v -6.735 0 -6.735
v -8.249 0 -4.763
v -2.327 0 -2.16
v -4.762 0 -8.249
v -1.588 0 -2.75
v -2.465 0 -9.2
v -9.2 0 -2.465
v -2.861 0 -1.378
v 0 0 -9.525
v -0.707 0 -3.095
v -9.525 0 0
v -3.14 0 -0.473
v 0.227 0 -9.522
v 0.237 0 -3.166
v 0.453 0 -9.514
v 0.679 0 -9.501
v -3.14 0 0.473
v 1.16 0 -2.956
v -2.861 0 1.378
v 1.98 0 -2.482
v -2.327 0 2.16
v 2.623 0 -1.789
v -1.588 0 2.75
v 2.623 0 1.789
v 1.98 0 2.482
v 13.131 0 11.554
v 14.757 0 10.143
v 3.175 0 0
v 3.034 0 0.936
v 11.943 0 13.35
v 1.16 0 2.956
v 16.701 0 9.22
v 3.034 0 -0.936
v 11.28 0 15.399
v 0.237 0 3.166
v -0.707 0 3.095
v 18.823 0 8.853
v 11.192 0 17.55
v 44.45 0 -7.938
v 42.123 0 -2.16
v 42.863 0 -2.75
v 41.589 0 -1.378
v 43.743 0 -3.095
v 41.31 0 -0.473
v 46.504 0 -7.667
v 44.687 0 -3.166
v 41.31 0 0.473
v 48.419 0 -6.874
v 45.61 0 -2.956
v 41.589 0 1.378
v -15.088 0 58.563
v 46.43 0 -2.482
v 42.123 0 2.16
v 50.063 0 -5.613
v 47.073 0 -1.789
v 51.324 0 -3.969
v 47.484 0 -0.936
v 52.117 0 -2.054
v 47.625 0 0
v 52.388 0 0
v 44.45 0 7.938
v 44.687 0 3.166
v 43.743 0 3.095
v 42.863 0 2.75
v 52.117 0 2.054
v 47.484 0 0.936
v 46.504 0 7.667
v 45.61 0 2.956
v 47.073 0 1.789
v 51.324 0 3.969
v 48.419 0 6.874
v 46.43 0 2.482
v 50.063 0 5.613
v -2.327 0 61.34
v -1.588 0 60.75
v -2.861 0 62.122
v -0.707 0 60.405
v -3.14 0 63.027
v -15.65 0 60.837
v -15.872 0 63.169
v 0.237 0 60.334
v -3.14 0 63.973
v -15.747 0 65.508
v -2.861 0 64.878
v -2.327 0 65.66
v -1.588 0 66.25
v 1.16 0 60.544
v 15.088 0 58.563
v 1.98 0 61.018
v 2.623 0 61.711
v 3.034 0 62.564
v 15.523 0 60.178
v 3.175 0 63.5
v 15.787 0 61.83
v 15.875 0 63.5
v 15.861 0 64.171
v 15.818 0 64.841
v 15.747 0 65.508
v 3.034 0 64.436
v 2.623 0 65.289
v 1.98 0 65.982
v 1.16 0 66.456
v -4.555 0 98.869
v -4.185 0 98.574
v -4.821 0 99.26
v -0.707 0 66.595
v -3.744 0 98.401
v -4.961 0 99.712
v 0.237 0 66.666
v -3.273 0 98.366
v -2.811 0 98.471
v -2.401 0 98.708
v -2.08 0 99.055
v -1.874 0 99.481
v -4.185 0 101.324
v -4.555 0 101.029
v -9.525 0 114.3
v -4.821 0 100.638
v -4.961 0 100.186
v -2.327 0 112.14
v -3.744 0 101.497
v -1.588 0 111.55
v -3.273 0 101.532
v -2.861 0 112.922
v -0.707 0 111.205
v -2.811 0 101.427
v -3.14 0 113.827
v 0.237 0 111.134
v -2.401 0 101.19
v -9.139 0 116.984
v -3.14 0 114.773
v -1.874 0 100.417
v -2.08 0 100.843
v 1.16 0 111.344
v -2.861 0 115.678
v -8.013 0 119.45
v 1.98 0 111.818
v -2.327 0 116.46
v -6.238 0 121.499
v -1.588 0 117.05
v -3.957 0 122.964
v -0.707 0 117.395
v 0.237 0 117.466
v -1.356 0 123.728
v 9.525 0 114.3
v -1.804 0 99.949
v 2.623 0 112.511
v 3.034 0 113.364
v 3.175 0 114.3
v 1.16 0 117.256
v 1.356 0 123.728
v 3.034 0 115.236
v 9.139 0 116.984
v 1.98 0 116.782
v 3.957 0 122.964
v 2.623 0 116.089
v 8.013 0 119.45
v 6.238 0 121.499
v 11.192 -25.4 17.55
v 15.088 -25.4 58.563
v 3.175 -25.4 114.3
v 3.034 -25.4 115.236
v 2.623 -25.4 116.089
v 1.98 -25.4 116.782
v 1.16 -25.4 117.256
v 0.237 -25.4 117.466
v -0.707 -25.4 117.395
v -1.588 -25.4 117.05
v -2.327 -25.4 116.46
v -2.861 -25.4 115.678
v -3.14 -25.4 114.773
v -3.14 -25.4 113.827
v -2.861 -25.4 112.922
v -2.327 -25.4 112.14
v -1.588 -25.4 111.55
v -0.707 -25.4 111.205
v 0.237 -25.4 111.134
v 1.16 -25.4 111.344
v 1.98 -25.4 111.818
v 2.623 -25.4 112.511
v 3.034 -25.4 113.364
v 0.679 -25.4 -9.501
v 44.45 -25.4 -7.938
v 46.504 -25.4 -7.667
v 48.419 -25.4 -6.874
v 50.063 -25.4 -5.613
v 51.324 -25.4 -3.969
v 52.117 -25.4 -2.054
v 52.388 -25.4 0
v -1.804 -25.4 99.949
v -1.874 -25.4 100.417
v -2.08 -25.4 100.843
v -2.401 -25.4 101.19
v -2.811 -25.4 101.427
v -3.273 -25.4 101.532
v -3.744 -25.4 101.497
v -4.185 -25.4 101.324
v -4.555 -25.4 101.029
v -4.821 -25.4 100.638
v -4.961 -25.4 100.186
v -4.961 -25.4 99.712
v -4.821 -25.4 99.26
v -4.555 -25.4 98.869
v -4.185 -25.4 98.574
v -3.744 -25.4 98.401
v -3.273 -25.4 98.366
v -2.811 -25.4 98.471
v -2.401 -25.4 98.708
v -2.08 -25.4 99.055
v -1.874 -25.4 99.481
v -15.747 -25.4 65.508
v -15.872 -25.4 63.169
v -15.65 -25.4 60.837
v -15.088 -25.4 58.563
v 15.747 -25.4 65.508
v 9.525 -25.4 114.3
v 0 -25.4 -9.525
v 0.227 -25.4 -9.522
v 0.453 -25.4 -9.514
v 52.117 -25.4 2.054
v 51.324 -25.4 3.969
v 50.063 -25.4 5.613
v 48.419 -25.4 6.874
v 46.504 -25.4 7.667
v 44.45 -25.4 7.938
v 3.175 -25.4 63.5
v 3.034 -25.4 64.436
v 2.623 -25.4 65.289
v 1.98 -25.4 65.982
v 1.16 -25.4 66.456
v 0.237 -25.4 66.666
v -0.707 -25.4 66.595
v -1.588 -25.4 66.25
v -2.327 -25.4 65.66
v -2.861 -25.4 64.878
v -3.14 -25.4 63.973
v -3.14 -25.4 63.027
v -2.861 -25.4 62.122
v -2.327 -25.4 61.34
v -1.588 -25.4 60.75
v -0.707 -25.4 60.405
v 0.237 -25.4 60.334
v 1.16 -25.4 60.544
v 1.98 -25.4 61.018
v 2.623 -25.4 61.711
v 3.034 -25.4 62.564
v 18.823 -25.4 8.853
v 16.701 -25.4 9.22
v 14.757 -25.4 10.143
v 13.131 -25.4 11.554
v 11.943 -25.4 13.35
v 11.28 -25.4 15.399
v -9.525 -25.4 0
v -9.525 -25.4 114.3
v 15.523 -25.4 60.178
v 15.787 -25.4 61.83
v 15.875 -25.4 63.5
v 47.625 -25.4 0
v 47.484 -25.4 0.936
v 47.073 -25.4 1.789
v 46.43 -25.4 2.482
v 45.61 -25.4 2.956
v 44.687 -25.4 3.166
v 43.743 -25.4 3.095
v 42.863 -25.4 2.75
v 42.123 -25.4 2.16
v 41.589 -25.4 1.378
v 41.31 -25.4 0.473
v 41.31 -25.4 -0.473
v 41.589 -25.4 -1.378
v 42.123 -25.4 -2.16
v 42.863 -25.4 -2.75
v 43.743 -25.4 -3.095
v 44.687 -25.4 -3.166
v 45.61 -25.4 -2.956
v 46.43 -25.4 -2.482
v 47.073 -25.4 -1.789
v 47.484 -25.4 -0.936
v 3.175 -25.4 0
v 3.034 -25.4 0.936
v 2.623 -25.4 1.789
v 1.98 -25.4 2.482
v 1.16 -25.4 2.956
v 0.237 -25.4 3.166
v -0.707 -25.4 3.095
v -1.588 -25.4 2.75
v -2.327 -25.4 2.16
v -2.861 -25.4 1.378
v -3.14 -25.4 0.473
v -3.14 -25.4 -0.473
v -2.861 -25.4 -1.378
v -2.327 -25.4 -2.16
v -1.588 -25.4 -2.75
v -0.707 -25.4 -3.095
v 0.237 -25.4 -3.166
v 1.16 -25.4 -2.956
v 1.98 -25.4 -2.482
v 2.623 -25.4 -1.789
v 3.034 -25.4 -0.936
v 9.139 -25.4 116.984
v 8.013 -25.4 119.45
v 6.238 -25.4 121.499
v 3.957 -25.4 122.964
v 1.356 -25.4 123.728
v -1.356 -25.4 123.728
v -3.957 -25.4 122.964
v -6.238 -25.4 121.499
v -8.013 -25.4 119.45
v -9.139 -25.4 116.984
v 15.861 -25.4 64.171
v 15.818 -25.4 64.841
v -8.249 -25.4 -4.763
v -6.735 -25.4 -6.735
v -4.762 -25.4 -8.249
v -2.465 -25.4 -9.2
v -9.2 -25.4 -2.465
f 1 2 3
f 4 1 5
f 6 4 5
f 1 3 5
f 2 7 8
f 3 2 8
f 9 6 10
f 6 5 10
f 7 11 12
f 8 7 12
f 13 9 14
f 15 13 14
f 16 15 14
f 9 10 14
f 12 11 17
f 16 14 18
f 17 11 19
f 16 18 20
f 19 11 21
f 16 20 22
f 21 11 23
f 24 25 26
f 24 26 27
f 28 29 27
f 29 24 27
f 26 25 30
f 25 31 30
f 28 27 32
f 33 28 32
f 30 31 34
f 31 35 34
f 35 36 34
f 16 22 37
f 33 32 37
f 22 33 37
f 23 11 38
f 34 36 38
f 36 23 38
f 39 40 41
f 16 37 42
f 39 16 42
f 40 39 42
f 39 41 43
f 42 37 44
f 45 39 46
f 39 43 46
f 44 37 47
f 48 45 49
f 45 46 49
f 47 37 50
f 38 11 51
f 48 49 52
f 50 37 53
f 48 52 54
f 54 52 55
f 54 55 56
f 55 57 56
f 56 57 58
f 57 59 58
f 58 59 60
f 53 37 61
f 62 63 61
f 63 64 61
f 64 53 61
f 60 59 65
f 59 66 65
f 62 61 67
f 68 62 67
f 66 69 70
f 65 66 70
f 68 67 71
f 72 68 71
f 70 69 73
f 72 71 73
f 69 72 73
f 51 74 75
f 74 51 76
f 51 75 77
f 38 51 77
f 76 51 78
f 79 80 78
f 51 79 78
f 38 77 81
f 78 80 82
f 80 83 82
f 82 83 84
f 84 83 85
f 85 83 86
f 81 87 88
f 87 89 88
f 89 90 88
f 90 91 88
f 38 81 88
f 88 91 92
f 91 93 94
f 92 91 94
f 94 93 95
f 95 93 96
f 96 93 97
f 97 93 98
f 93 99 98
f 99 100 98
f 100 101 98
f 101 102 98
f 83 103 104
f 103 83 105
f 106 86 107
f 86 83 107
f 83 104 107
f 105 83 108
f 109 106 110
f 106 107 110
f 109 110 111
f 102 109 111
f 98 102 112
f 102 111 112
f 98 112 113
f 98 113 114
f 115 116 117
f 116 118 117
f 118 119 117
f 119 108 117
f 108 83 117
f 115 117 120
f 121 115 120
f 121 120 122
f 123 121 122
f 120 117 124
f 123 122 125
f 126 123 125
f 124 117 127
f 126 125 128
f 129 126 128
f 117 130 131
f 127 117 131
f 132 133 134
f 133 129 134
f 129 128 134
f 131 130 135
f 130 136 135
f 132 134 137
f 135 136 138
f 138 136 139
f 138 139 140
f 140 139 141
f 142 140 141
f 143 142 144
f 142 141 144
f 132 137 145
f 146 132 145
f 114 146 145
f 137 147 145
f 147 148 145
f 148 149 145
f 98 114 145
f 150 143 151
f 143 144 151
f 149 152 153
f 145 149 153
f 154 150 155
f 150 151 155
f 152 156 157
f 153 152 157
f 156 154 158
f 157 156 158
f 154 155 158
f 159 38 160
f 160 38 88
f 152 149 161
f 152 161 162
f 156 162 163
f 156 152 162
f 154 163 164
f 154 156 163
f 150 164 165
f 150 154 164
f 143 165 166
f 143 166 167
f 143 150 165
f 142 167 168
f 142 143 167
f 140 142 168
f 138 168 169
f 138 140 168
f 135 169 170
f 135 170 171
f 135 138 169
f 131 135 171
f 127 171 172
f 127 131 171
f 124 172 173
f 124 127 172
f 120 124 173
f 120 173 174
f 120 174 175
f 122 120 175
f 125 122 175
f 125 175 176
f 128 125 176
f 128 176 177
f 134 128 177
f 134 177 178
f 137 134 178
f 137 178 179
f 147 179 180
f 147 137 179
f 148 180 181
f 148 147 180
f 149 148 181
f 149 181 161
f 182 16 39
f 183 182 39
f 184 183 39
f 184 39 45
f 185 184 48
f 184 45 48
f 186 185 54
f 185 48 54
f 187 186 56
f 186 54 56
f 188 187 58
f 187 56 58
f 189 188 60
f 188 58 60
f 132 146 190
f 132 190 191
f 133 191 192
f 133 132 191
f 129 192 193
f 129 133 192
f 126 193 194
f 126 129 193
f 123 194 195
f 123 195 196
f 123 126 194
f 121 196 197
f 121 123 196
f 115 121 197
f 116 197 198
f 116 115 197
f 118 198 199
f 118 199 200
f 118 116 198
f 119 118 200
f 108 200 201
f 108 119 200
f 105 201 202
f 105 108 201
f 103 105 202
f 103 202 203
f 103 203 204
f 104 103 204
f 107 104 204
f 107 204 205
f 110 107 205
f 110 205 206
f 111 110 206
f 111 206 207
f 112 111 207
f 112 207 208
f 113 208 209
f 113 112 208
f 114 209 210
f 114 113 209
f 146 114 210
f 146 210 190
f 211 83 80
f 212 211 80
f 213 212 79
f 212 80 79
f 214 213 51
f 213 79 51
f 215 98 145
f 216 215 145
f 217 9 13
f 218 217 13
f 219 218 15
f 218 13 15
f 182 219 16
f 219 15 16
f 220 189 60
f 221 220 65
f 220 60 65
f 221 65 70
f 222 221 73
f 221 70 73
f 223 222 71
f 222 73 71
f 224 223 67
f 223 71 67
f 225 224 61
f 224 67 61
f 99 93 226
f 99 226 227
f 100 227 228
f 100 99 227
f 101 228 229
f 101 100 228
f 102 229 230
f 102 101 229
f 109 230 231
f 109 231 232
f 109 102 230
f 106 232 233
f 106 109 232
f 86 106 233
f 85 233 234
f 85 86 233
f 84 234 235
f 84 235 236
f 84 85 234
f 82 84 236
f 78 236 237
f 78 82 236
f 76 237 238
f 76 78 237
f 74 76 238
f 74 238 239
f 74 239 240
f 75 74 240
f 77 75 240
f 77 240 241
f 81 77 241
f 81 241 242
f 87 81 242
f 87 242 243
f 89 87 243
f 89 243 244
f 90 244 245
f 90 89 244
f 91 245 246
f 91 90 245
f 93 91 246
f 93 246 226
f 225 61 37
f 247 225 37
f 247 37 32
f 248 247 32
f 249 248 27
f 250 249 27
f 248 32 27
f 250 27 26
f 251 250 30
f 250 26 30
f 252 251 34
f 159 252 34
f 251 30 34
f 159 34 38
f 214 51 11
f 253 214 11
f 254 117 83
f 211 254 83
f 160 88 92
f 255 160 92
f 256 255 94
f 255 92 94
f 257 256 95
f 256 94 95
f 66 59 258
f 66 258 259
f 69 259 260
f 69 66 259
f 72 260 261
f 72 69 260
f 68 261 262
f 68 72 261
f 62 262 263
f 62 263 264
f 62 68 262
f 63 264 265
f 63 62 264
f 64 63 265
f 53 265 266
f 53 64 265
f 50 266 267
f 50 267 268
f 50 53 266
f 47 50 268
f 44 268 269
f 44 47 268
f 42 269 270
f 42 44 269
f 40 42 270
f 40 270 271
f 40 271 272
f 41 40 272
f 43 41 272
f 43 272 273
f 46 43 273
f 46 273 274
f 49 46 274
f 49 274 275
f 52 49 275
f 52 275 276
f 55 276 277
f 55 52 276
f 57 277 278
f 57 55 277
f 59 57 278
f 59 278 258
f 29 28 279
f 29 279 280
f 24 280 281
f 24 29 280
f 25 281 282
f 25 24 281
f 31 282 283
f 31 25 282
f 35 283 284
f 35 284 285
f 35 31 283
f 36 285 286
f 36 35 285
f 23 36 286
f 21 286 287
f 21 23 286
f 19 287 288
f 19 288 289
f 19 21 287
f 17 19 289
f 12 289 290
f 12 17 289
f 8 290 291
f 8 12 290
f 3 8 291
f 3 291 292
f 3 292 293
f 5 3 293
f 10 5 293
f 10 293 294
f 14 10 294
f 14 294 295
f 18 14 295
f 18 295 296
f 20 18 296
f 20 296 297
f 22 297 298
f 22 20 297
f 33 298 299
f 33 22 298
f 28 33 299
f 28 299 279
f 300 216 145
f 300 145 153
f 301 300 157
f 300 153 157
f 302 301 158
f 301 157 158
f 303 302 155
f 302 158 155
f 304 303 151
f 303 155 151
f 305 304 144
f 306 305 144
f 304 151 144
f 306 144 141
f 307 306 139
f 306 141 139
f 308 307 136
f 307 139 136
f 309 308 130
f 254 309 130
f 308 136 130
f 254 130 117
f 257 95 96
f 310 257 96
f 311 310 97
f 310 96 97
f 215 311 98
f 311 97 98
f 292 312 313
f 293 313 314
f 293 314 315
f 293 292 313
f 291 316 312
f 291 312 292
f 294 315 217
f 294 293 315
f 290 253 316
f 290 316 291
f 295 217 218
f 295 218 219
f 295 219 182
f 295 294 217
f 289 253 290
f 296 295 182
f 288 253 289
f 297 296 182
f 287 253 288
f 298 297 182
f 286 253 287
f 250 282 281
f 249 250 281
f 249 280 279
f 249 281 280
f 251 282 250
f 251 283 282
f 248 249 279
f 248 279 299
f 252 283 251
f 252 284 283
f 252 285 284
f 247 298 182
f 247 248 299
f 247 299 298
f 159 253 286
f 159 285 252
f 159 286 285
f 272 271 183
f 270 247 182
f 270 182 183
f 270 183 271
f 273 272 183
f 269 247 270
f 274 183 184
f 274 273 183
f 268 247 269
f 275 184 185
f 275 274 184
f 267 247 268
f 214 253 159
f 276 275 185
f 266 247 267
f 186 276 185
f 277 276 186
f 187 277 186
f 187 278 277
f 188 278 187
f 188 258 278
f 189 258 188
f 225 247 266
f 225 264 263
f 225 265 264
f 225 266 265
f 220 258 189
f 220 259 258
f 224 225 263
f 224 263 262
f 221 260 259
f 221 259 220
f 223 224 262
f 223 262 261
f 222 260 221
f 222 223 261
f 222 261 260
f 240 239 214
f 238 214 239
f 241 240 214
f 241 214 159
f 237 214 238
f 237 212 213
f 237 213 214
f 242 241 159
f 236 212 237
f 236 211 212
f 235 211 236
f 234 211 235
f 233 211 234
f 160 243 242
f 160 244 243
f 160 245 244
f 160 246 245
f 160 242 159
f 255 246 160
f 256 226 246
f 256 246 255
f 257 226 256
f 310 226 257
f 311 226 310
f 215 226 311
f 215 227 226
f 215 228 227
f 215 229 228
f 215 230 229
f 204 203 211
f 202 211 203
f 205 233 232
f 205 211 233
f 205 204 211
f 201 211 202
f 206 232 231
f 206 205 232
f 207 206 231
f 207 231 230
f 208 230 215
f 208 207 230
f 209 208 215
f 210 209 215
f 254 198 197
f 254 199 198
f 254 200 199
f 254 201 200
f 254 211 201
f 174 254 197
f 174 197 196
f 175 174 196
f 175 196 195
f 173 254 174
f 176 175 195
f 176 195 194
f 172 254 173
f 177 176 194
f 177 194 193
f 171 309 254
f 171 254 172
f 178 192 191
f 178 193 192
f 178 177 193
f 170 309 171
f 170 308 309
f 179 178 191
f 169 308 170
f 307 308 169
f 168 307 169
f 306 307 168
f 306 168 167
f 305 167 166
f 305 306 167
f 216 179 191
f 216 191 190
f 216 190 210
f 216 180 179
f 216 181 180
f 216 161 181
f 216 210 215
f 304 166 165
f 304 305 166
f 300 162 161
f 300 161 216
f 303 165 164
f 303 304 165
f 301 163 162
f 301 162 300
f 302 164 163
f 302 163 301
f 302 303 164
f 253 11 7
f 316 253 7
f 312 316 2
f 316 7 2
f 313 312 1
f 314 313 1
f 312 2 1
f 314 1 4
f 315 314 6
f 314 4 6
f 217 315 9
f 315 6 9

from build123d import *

# Parameters (mm, degrees)
F0_R     = 3.175
F0_R_2   = 1.5875
F1_DEPTH = 25.4


with BuildPart() as f1:
    # F0 (on Front) → F1 (new body)
    with BuildSketch(Plane.XZ):
        with BuildLine():
            ThreePointArc((15.0877196672, 58.5627598555), (15.6769444522, 61.0001924791), (15.875, 63.5))
            ThreePointArc((15.875, 63.5), (15.8430821396, 64.5061676396), (15.7474569047, 65.5082893304))
            Line((15.7474569047, 65.5082893304), (15.0877196672, 58.5627598555))
        make_face()
        with BuildLine():
            Line((15.0877196672, 58.5627598555), (15.7474569047, 65.5082893304))
            ThreePointArc((15.7474569047, 65.5082893304), (0, 79.375), (-15.7474569047, 65.5082893304))
            Line((-15.7474569047, 65.5082893304), (-15.0877196672, 58.5627598555))
            ThreePointArc((-15.0877196672, 58.5627598555), (0, 47.625), (15.0877196672, 58.5627598555))
        make_face()
        with Locations((0, 63.5)):
            Circle(F0_R, mode=Mode.SUBTRACT)
        with BuildLine():
            ThreePointArc((-15.7474569047, 65.5082893304), (0, 79.375), (15.7474569047, 65.5082893304))
            Line((15.7474569047, 65.5082893304), (9.525, 114.3))
            ThreePointArc((9.525, 114.3), (0, 104.775), (-9.525, 114.3))
            Line((-9.525, 114.3), (-15.7474569047, 65.5082893304))
        make_face()
        with Locations((-3.3911804203, 99.949)):
            Circle(F0_R_2, mode=Mode.SUBTRACT)
        with BuildLine():
            Line((11.1919966494, 17.549675393), (15.0877196672, 58.5627598555))
            ThreePointArc((15.0877196672, 58.5627598555), (0, 47.625), (-15.0877196672, 58.5627598555))
            Line((-15.0877196672, 58.5627598555), (-9.525, 0))
            ThreePointArc((-9.525, 0), (0, 9.525), (9.525, 0))
            ThreePointArc((9.525, 0), (6.9712901065, -6.4905114784), (0.6794904459, -9.5007324841))
            Line((0.6794904459, -9.5007324841), (44.45, -7.9375))
            ThreePointArc((44.45, -7.9375), (36.5125, 0), (44.45, 7.9375))
            Line((44.45, 7.9375), (18.8228170321, 8.8527565346))
            ThreePointArc((18.8228170321, 8.8527565346), (13.130598856, 11.5544736108), (11.1919966494, 17.549675393))
        make_face()
        with BuildLine():
            Line((-15.0877196672, 58.5627598555), (-15.7474569047, 65.5082893304))
            ThreePointArc((-15.7474569047, 65.5082893304), (-15.8038641944, 61.9988332792), (-15.0877196672, 58.5627598555))
        make_face()
        with BuildLine():
            ThreePointArc((-9.525, 114.3), (0, 104.775), (9.525, 114.3))
            ThreePointArc((9.525, 114.3), (0, 123.825), (-9.525, 114.3))
        make_face()
        with Locations((0, 114.3)):
            Circle(F0_R, mode=Mode.SUBTRACT)
        with BuildLine():
            ThreePointArc((9.525, 0), (0, 9.525), (-9.525, 0))
            ThreePointArc((-9.525, 0), (-6.7351920908, -6.7351920908), (0, -9.525))
            Line((0, -9.525), (0.6794904459, -9.5007324841))
            ThreePointArc((0.6794904459, -9.5007324841), (6.9712901065, -6.4905114784), (9.525, 0))
        make_face()
        Circle(F0_R, mode=Mode.SUBTRACT)
        with BuildLine():
            Line((0.6794904459, -9.5007324841), (0, -9.525))
            ThreePointArc((0, -9.525), (0.3399618281, -9.5189311877), (0.6794904459, -9.5007324841))
        make_face()
        with BuildLine():
            ThreePointArc((52.3875, 0), (50.0626600757, 5.6126600757), (44.45, 7.9375))
            ThreePointArc((44.45, 7.9375), (36.5125, 0), (44.45, -7.9375))
            ThreePointArc((44.45, -7.9375), (50.0626600757, -5.6126600757), (52.3875, 0))
        make_face()
        with Locations((44.45, 0)):
            Circle(F0_R, mode=Mode.SUBTRACT)
    extrude(amount=F1_DEPTH)


solid = f1.part
